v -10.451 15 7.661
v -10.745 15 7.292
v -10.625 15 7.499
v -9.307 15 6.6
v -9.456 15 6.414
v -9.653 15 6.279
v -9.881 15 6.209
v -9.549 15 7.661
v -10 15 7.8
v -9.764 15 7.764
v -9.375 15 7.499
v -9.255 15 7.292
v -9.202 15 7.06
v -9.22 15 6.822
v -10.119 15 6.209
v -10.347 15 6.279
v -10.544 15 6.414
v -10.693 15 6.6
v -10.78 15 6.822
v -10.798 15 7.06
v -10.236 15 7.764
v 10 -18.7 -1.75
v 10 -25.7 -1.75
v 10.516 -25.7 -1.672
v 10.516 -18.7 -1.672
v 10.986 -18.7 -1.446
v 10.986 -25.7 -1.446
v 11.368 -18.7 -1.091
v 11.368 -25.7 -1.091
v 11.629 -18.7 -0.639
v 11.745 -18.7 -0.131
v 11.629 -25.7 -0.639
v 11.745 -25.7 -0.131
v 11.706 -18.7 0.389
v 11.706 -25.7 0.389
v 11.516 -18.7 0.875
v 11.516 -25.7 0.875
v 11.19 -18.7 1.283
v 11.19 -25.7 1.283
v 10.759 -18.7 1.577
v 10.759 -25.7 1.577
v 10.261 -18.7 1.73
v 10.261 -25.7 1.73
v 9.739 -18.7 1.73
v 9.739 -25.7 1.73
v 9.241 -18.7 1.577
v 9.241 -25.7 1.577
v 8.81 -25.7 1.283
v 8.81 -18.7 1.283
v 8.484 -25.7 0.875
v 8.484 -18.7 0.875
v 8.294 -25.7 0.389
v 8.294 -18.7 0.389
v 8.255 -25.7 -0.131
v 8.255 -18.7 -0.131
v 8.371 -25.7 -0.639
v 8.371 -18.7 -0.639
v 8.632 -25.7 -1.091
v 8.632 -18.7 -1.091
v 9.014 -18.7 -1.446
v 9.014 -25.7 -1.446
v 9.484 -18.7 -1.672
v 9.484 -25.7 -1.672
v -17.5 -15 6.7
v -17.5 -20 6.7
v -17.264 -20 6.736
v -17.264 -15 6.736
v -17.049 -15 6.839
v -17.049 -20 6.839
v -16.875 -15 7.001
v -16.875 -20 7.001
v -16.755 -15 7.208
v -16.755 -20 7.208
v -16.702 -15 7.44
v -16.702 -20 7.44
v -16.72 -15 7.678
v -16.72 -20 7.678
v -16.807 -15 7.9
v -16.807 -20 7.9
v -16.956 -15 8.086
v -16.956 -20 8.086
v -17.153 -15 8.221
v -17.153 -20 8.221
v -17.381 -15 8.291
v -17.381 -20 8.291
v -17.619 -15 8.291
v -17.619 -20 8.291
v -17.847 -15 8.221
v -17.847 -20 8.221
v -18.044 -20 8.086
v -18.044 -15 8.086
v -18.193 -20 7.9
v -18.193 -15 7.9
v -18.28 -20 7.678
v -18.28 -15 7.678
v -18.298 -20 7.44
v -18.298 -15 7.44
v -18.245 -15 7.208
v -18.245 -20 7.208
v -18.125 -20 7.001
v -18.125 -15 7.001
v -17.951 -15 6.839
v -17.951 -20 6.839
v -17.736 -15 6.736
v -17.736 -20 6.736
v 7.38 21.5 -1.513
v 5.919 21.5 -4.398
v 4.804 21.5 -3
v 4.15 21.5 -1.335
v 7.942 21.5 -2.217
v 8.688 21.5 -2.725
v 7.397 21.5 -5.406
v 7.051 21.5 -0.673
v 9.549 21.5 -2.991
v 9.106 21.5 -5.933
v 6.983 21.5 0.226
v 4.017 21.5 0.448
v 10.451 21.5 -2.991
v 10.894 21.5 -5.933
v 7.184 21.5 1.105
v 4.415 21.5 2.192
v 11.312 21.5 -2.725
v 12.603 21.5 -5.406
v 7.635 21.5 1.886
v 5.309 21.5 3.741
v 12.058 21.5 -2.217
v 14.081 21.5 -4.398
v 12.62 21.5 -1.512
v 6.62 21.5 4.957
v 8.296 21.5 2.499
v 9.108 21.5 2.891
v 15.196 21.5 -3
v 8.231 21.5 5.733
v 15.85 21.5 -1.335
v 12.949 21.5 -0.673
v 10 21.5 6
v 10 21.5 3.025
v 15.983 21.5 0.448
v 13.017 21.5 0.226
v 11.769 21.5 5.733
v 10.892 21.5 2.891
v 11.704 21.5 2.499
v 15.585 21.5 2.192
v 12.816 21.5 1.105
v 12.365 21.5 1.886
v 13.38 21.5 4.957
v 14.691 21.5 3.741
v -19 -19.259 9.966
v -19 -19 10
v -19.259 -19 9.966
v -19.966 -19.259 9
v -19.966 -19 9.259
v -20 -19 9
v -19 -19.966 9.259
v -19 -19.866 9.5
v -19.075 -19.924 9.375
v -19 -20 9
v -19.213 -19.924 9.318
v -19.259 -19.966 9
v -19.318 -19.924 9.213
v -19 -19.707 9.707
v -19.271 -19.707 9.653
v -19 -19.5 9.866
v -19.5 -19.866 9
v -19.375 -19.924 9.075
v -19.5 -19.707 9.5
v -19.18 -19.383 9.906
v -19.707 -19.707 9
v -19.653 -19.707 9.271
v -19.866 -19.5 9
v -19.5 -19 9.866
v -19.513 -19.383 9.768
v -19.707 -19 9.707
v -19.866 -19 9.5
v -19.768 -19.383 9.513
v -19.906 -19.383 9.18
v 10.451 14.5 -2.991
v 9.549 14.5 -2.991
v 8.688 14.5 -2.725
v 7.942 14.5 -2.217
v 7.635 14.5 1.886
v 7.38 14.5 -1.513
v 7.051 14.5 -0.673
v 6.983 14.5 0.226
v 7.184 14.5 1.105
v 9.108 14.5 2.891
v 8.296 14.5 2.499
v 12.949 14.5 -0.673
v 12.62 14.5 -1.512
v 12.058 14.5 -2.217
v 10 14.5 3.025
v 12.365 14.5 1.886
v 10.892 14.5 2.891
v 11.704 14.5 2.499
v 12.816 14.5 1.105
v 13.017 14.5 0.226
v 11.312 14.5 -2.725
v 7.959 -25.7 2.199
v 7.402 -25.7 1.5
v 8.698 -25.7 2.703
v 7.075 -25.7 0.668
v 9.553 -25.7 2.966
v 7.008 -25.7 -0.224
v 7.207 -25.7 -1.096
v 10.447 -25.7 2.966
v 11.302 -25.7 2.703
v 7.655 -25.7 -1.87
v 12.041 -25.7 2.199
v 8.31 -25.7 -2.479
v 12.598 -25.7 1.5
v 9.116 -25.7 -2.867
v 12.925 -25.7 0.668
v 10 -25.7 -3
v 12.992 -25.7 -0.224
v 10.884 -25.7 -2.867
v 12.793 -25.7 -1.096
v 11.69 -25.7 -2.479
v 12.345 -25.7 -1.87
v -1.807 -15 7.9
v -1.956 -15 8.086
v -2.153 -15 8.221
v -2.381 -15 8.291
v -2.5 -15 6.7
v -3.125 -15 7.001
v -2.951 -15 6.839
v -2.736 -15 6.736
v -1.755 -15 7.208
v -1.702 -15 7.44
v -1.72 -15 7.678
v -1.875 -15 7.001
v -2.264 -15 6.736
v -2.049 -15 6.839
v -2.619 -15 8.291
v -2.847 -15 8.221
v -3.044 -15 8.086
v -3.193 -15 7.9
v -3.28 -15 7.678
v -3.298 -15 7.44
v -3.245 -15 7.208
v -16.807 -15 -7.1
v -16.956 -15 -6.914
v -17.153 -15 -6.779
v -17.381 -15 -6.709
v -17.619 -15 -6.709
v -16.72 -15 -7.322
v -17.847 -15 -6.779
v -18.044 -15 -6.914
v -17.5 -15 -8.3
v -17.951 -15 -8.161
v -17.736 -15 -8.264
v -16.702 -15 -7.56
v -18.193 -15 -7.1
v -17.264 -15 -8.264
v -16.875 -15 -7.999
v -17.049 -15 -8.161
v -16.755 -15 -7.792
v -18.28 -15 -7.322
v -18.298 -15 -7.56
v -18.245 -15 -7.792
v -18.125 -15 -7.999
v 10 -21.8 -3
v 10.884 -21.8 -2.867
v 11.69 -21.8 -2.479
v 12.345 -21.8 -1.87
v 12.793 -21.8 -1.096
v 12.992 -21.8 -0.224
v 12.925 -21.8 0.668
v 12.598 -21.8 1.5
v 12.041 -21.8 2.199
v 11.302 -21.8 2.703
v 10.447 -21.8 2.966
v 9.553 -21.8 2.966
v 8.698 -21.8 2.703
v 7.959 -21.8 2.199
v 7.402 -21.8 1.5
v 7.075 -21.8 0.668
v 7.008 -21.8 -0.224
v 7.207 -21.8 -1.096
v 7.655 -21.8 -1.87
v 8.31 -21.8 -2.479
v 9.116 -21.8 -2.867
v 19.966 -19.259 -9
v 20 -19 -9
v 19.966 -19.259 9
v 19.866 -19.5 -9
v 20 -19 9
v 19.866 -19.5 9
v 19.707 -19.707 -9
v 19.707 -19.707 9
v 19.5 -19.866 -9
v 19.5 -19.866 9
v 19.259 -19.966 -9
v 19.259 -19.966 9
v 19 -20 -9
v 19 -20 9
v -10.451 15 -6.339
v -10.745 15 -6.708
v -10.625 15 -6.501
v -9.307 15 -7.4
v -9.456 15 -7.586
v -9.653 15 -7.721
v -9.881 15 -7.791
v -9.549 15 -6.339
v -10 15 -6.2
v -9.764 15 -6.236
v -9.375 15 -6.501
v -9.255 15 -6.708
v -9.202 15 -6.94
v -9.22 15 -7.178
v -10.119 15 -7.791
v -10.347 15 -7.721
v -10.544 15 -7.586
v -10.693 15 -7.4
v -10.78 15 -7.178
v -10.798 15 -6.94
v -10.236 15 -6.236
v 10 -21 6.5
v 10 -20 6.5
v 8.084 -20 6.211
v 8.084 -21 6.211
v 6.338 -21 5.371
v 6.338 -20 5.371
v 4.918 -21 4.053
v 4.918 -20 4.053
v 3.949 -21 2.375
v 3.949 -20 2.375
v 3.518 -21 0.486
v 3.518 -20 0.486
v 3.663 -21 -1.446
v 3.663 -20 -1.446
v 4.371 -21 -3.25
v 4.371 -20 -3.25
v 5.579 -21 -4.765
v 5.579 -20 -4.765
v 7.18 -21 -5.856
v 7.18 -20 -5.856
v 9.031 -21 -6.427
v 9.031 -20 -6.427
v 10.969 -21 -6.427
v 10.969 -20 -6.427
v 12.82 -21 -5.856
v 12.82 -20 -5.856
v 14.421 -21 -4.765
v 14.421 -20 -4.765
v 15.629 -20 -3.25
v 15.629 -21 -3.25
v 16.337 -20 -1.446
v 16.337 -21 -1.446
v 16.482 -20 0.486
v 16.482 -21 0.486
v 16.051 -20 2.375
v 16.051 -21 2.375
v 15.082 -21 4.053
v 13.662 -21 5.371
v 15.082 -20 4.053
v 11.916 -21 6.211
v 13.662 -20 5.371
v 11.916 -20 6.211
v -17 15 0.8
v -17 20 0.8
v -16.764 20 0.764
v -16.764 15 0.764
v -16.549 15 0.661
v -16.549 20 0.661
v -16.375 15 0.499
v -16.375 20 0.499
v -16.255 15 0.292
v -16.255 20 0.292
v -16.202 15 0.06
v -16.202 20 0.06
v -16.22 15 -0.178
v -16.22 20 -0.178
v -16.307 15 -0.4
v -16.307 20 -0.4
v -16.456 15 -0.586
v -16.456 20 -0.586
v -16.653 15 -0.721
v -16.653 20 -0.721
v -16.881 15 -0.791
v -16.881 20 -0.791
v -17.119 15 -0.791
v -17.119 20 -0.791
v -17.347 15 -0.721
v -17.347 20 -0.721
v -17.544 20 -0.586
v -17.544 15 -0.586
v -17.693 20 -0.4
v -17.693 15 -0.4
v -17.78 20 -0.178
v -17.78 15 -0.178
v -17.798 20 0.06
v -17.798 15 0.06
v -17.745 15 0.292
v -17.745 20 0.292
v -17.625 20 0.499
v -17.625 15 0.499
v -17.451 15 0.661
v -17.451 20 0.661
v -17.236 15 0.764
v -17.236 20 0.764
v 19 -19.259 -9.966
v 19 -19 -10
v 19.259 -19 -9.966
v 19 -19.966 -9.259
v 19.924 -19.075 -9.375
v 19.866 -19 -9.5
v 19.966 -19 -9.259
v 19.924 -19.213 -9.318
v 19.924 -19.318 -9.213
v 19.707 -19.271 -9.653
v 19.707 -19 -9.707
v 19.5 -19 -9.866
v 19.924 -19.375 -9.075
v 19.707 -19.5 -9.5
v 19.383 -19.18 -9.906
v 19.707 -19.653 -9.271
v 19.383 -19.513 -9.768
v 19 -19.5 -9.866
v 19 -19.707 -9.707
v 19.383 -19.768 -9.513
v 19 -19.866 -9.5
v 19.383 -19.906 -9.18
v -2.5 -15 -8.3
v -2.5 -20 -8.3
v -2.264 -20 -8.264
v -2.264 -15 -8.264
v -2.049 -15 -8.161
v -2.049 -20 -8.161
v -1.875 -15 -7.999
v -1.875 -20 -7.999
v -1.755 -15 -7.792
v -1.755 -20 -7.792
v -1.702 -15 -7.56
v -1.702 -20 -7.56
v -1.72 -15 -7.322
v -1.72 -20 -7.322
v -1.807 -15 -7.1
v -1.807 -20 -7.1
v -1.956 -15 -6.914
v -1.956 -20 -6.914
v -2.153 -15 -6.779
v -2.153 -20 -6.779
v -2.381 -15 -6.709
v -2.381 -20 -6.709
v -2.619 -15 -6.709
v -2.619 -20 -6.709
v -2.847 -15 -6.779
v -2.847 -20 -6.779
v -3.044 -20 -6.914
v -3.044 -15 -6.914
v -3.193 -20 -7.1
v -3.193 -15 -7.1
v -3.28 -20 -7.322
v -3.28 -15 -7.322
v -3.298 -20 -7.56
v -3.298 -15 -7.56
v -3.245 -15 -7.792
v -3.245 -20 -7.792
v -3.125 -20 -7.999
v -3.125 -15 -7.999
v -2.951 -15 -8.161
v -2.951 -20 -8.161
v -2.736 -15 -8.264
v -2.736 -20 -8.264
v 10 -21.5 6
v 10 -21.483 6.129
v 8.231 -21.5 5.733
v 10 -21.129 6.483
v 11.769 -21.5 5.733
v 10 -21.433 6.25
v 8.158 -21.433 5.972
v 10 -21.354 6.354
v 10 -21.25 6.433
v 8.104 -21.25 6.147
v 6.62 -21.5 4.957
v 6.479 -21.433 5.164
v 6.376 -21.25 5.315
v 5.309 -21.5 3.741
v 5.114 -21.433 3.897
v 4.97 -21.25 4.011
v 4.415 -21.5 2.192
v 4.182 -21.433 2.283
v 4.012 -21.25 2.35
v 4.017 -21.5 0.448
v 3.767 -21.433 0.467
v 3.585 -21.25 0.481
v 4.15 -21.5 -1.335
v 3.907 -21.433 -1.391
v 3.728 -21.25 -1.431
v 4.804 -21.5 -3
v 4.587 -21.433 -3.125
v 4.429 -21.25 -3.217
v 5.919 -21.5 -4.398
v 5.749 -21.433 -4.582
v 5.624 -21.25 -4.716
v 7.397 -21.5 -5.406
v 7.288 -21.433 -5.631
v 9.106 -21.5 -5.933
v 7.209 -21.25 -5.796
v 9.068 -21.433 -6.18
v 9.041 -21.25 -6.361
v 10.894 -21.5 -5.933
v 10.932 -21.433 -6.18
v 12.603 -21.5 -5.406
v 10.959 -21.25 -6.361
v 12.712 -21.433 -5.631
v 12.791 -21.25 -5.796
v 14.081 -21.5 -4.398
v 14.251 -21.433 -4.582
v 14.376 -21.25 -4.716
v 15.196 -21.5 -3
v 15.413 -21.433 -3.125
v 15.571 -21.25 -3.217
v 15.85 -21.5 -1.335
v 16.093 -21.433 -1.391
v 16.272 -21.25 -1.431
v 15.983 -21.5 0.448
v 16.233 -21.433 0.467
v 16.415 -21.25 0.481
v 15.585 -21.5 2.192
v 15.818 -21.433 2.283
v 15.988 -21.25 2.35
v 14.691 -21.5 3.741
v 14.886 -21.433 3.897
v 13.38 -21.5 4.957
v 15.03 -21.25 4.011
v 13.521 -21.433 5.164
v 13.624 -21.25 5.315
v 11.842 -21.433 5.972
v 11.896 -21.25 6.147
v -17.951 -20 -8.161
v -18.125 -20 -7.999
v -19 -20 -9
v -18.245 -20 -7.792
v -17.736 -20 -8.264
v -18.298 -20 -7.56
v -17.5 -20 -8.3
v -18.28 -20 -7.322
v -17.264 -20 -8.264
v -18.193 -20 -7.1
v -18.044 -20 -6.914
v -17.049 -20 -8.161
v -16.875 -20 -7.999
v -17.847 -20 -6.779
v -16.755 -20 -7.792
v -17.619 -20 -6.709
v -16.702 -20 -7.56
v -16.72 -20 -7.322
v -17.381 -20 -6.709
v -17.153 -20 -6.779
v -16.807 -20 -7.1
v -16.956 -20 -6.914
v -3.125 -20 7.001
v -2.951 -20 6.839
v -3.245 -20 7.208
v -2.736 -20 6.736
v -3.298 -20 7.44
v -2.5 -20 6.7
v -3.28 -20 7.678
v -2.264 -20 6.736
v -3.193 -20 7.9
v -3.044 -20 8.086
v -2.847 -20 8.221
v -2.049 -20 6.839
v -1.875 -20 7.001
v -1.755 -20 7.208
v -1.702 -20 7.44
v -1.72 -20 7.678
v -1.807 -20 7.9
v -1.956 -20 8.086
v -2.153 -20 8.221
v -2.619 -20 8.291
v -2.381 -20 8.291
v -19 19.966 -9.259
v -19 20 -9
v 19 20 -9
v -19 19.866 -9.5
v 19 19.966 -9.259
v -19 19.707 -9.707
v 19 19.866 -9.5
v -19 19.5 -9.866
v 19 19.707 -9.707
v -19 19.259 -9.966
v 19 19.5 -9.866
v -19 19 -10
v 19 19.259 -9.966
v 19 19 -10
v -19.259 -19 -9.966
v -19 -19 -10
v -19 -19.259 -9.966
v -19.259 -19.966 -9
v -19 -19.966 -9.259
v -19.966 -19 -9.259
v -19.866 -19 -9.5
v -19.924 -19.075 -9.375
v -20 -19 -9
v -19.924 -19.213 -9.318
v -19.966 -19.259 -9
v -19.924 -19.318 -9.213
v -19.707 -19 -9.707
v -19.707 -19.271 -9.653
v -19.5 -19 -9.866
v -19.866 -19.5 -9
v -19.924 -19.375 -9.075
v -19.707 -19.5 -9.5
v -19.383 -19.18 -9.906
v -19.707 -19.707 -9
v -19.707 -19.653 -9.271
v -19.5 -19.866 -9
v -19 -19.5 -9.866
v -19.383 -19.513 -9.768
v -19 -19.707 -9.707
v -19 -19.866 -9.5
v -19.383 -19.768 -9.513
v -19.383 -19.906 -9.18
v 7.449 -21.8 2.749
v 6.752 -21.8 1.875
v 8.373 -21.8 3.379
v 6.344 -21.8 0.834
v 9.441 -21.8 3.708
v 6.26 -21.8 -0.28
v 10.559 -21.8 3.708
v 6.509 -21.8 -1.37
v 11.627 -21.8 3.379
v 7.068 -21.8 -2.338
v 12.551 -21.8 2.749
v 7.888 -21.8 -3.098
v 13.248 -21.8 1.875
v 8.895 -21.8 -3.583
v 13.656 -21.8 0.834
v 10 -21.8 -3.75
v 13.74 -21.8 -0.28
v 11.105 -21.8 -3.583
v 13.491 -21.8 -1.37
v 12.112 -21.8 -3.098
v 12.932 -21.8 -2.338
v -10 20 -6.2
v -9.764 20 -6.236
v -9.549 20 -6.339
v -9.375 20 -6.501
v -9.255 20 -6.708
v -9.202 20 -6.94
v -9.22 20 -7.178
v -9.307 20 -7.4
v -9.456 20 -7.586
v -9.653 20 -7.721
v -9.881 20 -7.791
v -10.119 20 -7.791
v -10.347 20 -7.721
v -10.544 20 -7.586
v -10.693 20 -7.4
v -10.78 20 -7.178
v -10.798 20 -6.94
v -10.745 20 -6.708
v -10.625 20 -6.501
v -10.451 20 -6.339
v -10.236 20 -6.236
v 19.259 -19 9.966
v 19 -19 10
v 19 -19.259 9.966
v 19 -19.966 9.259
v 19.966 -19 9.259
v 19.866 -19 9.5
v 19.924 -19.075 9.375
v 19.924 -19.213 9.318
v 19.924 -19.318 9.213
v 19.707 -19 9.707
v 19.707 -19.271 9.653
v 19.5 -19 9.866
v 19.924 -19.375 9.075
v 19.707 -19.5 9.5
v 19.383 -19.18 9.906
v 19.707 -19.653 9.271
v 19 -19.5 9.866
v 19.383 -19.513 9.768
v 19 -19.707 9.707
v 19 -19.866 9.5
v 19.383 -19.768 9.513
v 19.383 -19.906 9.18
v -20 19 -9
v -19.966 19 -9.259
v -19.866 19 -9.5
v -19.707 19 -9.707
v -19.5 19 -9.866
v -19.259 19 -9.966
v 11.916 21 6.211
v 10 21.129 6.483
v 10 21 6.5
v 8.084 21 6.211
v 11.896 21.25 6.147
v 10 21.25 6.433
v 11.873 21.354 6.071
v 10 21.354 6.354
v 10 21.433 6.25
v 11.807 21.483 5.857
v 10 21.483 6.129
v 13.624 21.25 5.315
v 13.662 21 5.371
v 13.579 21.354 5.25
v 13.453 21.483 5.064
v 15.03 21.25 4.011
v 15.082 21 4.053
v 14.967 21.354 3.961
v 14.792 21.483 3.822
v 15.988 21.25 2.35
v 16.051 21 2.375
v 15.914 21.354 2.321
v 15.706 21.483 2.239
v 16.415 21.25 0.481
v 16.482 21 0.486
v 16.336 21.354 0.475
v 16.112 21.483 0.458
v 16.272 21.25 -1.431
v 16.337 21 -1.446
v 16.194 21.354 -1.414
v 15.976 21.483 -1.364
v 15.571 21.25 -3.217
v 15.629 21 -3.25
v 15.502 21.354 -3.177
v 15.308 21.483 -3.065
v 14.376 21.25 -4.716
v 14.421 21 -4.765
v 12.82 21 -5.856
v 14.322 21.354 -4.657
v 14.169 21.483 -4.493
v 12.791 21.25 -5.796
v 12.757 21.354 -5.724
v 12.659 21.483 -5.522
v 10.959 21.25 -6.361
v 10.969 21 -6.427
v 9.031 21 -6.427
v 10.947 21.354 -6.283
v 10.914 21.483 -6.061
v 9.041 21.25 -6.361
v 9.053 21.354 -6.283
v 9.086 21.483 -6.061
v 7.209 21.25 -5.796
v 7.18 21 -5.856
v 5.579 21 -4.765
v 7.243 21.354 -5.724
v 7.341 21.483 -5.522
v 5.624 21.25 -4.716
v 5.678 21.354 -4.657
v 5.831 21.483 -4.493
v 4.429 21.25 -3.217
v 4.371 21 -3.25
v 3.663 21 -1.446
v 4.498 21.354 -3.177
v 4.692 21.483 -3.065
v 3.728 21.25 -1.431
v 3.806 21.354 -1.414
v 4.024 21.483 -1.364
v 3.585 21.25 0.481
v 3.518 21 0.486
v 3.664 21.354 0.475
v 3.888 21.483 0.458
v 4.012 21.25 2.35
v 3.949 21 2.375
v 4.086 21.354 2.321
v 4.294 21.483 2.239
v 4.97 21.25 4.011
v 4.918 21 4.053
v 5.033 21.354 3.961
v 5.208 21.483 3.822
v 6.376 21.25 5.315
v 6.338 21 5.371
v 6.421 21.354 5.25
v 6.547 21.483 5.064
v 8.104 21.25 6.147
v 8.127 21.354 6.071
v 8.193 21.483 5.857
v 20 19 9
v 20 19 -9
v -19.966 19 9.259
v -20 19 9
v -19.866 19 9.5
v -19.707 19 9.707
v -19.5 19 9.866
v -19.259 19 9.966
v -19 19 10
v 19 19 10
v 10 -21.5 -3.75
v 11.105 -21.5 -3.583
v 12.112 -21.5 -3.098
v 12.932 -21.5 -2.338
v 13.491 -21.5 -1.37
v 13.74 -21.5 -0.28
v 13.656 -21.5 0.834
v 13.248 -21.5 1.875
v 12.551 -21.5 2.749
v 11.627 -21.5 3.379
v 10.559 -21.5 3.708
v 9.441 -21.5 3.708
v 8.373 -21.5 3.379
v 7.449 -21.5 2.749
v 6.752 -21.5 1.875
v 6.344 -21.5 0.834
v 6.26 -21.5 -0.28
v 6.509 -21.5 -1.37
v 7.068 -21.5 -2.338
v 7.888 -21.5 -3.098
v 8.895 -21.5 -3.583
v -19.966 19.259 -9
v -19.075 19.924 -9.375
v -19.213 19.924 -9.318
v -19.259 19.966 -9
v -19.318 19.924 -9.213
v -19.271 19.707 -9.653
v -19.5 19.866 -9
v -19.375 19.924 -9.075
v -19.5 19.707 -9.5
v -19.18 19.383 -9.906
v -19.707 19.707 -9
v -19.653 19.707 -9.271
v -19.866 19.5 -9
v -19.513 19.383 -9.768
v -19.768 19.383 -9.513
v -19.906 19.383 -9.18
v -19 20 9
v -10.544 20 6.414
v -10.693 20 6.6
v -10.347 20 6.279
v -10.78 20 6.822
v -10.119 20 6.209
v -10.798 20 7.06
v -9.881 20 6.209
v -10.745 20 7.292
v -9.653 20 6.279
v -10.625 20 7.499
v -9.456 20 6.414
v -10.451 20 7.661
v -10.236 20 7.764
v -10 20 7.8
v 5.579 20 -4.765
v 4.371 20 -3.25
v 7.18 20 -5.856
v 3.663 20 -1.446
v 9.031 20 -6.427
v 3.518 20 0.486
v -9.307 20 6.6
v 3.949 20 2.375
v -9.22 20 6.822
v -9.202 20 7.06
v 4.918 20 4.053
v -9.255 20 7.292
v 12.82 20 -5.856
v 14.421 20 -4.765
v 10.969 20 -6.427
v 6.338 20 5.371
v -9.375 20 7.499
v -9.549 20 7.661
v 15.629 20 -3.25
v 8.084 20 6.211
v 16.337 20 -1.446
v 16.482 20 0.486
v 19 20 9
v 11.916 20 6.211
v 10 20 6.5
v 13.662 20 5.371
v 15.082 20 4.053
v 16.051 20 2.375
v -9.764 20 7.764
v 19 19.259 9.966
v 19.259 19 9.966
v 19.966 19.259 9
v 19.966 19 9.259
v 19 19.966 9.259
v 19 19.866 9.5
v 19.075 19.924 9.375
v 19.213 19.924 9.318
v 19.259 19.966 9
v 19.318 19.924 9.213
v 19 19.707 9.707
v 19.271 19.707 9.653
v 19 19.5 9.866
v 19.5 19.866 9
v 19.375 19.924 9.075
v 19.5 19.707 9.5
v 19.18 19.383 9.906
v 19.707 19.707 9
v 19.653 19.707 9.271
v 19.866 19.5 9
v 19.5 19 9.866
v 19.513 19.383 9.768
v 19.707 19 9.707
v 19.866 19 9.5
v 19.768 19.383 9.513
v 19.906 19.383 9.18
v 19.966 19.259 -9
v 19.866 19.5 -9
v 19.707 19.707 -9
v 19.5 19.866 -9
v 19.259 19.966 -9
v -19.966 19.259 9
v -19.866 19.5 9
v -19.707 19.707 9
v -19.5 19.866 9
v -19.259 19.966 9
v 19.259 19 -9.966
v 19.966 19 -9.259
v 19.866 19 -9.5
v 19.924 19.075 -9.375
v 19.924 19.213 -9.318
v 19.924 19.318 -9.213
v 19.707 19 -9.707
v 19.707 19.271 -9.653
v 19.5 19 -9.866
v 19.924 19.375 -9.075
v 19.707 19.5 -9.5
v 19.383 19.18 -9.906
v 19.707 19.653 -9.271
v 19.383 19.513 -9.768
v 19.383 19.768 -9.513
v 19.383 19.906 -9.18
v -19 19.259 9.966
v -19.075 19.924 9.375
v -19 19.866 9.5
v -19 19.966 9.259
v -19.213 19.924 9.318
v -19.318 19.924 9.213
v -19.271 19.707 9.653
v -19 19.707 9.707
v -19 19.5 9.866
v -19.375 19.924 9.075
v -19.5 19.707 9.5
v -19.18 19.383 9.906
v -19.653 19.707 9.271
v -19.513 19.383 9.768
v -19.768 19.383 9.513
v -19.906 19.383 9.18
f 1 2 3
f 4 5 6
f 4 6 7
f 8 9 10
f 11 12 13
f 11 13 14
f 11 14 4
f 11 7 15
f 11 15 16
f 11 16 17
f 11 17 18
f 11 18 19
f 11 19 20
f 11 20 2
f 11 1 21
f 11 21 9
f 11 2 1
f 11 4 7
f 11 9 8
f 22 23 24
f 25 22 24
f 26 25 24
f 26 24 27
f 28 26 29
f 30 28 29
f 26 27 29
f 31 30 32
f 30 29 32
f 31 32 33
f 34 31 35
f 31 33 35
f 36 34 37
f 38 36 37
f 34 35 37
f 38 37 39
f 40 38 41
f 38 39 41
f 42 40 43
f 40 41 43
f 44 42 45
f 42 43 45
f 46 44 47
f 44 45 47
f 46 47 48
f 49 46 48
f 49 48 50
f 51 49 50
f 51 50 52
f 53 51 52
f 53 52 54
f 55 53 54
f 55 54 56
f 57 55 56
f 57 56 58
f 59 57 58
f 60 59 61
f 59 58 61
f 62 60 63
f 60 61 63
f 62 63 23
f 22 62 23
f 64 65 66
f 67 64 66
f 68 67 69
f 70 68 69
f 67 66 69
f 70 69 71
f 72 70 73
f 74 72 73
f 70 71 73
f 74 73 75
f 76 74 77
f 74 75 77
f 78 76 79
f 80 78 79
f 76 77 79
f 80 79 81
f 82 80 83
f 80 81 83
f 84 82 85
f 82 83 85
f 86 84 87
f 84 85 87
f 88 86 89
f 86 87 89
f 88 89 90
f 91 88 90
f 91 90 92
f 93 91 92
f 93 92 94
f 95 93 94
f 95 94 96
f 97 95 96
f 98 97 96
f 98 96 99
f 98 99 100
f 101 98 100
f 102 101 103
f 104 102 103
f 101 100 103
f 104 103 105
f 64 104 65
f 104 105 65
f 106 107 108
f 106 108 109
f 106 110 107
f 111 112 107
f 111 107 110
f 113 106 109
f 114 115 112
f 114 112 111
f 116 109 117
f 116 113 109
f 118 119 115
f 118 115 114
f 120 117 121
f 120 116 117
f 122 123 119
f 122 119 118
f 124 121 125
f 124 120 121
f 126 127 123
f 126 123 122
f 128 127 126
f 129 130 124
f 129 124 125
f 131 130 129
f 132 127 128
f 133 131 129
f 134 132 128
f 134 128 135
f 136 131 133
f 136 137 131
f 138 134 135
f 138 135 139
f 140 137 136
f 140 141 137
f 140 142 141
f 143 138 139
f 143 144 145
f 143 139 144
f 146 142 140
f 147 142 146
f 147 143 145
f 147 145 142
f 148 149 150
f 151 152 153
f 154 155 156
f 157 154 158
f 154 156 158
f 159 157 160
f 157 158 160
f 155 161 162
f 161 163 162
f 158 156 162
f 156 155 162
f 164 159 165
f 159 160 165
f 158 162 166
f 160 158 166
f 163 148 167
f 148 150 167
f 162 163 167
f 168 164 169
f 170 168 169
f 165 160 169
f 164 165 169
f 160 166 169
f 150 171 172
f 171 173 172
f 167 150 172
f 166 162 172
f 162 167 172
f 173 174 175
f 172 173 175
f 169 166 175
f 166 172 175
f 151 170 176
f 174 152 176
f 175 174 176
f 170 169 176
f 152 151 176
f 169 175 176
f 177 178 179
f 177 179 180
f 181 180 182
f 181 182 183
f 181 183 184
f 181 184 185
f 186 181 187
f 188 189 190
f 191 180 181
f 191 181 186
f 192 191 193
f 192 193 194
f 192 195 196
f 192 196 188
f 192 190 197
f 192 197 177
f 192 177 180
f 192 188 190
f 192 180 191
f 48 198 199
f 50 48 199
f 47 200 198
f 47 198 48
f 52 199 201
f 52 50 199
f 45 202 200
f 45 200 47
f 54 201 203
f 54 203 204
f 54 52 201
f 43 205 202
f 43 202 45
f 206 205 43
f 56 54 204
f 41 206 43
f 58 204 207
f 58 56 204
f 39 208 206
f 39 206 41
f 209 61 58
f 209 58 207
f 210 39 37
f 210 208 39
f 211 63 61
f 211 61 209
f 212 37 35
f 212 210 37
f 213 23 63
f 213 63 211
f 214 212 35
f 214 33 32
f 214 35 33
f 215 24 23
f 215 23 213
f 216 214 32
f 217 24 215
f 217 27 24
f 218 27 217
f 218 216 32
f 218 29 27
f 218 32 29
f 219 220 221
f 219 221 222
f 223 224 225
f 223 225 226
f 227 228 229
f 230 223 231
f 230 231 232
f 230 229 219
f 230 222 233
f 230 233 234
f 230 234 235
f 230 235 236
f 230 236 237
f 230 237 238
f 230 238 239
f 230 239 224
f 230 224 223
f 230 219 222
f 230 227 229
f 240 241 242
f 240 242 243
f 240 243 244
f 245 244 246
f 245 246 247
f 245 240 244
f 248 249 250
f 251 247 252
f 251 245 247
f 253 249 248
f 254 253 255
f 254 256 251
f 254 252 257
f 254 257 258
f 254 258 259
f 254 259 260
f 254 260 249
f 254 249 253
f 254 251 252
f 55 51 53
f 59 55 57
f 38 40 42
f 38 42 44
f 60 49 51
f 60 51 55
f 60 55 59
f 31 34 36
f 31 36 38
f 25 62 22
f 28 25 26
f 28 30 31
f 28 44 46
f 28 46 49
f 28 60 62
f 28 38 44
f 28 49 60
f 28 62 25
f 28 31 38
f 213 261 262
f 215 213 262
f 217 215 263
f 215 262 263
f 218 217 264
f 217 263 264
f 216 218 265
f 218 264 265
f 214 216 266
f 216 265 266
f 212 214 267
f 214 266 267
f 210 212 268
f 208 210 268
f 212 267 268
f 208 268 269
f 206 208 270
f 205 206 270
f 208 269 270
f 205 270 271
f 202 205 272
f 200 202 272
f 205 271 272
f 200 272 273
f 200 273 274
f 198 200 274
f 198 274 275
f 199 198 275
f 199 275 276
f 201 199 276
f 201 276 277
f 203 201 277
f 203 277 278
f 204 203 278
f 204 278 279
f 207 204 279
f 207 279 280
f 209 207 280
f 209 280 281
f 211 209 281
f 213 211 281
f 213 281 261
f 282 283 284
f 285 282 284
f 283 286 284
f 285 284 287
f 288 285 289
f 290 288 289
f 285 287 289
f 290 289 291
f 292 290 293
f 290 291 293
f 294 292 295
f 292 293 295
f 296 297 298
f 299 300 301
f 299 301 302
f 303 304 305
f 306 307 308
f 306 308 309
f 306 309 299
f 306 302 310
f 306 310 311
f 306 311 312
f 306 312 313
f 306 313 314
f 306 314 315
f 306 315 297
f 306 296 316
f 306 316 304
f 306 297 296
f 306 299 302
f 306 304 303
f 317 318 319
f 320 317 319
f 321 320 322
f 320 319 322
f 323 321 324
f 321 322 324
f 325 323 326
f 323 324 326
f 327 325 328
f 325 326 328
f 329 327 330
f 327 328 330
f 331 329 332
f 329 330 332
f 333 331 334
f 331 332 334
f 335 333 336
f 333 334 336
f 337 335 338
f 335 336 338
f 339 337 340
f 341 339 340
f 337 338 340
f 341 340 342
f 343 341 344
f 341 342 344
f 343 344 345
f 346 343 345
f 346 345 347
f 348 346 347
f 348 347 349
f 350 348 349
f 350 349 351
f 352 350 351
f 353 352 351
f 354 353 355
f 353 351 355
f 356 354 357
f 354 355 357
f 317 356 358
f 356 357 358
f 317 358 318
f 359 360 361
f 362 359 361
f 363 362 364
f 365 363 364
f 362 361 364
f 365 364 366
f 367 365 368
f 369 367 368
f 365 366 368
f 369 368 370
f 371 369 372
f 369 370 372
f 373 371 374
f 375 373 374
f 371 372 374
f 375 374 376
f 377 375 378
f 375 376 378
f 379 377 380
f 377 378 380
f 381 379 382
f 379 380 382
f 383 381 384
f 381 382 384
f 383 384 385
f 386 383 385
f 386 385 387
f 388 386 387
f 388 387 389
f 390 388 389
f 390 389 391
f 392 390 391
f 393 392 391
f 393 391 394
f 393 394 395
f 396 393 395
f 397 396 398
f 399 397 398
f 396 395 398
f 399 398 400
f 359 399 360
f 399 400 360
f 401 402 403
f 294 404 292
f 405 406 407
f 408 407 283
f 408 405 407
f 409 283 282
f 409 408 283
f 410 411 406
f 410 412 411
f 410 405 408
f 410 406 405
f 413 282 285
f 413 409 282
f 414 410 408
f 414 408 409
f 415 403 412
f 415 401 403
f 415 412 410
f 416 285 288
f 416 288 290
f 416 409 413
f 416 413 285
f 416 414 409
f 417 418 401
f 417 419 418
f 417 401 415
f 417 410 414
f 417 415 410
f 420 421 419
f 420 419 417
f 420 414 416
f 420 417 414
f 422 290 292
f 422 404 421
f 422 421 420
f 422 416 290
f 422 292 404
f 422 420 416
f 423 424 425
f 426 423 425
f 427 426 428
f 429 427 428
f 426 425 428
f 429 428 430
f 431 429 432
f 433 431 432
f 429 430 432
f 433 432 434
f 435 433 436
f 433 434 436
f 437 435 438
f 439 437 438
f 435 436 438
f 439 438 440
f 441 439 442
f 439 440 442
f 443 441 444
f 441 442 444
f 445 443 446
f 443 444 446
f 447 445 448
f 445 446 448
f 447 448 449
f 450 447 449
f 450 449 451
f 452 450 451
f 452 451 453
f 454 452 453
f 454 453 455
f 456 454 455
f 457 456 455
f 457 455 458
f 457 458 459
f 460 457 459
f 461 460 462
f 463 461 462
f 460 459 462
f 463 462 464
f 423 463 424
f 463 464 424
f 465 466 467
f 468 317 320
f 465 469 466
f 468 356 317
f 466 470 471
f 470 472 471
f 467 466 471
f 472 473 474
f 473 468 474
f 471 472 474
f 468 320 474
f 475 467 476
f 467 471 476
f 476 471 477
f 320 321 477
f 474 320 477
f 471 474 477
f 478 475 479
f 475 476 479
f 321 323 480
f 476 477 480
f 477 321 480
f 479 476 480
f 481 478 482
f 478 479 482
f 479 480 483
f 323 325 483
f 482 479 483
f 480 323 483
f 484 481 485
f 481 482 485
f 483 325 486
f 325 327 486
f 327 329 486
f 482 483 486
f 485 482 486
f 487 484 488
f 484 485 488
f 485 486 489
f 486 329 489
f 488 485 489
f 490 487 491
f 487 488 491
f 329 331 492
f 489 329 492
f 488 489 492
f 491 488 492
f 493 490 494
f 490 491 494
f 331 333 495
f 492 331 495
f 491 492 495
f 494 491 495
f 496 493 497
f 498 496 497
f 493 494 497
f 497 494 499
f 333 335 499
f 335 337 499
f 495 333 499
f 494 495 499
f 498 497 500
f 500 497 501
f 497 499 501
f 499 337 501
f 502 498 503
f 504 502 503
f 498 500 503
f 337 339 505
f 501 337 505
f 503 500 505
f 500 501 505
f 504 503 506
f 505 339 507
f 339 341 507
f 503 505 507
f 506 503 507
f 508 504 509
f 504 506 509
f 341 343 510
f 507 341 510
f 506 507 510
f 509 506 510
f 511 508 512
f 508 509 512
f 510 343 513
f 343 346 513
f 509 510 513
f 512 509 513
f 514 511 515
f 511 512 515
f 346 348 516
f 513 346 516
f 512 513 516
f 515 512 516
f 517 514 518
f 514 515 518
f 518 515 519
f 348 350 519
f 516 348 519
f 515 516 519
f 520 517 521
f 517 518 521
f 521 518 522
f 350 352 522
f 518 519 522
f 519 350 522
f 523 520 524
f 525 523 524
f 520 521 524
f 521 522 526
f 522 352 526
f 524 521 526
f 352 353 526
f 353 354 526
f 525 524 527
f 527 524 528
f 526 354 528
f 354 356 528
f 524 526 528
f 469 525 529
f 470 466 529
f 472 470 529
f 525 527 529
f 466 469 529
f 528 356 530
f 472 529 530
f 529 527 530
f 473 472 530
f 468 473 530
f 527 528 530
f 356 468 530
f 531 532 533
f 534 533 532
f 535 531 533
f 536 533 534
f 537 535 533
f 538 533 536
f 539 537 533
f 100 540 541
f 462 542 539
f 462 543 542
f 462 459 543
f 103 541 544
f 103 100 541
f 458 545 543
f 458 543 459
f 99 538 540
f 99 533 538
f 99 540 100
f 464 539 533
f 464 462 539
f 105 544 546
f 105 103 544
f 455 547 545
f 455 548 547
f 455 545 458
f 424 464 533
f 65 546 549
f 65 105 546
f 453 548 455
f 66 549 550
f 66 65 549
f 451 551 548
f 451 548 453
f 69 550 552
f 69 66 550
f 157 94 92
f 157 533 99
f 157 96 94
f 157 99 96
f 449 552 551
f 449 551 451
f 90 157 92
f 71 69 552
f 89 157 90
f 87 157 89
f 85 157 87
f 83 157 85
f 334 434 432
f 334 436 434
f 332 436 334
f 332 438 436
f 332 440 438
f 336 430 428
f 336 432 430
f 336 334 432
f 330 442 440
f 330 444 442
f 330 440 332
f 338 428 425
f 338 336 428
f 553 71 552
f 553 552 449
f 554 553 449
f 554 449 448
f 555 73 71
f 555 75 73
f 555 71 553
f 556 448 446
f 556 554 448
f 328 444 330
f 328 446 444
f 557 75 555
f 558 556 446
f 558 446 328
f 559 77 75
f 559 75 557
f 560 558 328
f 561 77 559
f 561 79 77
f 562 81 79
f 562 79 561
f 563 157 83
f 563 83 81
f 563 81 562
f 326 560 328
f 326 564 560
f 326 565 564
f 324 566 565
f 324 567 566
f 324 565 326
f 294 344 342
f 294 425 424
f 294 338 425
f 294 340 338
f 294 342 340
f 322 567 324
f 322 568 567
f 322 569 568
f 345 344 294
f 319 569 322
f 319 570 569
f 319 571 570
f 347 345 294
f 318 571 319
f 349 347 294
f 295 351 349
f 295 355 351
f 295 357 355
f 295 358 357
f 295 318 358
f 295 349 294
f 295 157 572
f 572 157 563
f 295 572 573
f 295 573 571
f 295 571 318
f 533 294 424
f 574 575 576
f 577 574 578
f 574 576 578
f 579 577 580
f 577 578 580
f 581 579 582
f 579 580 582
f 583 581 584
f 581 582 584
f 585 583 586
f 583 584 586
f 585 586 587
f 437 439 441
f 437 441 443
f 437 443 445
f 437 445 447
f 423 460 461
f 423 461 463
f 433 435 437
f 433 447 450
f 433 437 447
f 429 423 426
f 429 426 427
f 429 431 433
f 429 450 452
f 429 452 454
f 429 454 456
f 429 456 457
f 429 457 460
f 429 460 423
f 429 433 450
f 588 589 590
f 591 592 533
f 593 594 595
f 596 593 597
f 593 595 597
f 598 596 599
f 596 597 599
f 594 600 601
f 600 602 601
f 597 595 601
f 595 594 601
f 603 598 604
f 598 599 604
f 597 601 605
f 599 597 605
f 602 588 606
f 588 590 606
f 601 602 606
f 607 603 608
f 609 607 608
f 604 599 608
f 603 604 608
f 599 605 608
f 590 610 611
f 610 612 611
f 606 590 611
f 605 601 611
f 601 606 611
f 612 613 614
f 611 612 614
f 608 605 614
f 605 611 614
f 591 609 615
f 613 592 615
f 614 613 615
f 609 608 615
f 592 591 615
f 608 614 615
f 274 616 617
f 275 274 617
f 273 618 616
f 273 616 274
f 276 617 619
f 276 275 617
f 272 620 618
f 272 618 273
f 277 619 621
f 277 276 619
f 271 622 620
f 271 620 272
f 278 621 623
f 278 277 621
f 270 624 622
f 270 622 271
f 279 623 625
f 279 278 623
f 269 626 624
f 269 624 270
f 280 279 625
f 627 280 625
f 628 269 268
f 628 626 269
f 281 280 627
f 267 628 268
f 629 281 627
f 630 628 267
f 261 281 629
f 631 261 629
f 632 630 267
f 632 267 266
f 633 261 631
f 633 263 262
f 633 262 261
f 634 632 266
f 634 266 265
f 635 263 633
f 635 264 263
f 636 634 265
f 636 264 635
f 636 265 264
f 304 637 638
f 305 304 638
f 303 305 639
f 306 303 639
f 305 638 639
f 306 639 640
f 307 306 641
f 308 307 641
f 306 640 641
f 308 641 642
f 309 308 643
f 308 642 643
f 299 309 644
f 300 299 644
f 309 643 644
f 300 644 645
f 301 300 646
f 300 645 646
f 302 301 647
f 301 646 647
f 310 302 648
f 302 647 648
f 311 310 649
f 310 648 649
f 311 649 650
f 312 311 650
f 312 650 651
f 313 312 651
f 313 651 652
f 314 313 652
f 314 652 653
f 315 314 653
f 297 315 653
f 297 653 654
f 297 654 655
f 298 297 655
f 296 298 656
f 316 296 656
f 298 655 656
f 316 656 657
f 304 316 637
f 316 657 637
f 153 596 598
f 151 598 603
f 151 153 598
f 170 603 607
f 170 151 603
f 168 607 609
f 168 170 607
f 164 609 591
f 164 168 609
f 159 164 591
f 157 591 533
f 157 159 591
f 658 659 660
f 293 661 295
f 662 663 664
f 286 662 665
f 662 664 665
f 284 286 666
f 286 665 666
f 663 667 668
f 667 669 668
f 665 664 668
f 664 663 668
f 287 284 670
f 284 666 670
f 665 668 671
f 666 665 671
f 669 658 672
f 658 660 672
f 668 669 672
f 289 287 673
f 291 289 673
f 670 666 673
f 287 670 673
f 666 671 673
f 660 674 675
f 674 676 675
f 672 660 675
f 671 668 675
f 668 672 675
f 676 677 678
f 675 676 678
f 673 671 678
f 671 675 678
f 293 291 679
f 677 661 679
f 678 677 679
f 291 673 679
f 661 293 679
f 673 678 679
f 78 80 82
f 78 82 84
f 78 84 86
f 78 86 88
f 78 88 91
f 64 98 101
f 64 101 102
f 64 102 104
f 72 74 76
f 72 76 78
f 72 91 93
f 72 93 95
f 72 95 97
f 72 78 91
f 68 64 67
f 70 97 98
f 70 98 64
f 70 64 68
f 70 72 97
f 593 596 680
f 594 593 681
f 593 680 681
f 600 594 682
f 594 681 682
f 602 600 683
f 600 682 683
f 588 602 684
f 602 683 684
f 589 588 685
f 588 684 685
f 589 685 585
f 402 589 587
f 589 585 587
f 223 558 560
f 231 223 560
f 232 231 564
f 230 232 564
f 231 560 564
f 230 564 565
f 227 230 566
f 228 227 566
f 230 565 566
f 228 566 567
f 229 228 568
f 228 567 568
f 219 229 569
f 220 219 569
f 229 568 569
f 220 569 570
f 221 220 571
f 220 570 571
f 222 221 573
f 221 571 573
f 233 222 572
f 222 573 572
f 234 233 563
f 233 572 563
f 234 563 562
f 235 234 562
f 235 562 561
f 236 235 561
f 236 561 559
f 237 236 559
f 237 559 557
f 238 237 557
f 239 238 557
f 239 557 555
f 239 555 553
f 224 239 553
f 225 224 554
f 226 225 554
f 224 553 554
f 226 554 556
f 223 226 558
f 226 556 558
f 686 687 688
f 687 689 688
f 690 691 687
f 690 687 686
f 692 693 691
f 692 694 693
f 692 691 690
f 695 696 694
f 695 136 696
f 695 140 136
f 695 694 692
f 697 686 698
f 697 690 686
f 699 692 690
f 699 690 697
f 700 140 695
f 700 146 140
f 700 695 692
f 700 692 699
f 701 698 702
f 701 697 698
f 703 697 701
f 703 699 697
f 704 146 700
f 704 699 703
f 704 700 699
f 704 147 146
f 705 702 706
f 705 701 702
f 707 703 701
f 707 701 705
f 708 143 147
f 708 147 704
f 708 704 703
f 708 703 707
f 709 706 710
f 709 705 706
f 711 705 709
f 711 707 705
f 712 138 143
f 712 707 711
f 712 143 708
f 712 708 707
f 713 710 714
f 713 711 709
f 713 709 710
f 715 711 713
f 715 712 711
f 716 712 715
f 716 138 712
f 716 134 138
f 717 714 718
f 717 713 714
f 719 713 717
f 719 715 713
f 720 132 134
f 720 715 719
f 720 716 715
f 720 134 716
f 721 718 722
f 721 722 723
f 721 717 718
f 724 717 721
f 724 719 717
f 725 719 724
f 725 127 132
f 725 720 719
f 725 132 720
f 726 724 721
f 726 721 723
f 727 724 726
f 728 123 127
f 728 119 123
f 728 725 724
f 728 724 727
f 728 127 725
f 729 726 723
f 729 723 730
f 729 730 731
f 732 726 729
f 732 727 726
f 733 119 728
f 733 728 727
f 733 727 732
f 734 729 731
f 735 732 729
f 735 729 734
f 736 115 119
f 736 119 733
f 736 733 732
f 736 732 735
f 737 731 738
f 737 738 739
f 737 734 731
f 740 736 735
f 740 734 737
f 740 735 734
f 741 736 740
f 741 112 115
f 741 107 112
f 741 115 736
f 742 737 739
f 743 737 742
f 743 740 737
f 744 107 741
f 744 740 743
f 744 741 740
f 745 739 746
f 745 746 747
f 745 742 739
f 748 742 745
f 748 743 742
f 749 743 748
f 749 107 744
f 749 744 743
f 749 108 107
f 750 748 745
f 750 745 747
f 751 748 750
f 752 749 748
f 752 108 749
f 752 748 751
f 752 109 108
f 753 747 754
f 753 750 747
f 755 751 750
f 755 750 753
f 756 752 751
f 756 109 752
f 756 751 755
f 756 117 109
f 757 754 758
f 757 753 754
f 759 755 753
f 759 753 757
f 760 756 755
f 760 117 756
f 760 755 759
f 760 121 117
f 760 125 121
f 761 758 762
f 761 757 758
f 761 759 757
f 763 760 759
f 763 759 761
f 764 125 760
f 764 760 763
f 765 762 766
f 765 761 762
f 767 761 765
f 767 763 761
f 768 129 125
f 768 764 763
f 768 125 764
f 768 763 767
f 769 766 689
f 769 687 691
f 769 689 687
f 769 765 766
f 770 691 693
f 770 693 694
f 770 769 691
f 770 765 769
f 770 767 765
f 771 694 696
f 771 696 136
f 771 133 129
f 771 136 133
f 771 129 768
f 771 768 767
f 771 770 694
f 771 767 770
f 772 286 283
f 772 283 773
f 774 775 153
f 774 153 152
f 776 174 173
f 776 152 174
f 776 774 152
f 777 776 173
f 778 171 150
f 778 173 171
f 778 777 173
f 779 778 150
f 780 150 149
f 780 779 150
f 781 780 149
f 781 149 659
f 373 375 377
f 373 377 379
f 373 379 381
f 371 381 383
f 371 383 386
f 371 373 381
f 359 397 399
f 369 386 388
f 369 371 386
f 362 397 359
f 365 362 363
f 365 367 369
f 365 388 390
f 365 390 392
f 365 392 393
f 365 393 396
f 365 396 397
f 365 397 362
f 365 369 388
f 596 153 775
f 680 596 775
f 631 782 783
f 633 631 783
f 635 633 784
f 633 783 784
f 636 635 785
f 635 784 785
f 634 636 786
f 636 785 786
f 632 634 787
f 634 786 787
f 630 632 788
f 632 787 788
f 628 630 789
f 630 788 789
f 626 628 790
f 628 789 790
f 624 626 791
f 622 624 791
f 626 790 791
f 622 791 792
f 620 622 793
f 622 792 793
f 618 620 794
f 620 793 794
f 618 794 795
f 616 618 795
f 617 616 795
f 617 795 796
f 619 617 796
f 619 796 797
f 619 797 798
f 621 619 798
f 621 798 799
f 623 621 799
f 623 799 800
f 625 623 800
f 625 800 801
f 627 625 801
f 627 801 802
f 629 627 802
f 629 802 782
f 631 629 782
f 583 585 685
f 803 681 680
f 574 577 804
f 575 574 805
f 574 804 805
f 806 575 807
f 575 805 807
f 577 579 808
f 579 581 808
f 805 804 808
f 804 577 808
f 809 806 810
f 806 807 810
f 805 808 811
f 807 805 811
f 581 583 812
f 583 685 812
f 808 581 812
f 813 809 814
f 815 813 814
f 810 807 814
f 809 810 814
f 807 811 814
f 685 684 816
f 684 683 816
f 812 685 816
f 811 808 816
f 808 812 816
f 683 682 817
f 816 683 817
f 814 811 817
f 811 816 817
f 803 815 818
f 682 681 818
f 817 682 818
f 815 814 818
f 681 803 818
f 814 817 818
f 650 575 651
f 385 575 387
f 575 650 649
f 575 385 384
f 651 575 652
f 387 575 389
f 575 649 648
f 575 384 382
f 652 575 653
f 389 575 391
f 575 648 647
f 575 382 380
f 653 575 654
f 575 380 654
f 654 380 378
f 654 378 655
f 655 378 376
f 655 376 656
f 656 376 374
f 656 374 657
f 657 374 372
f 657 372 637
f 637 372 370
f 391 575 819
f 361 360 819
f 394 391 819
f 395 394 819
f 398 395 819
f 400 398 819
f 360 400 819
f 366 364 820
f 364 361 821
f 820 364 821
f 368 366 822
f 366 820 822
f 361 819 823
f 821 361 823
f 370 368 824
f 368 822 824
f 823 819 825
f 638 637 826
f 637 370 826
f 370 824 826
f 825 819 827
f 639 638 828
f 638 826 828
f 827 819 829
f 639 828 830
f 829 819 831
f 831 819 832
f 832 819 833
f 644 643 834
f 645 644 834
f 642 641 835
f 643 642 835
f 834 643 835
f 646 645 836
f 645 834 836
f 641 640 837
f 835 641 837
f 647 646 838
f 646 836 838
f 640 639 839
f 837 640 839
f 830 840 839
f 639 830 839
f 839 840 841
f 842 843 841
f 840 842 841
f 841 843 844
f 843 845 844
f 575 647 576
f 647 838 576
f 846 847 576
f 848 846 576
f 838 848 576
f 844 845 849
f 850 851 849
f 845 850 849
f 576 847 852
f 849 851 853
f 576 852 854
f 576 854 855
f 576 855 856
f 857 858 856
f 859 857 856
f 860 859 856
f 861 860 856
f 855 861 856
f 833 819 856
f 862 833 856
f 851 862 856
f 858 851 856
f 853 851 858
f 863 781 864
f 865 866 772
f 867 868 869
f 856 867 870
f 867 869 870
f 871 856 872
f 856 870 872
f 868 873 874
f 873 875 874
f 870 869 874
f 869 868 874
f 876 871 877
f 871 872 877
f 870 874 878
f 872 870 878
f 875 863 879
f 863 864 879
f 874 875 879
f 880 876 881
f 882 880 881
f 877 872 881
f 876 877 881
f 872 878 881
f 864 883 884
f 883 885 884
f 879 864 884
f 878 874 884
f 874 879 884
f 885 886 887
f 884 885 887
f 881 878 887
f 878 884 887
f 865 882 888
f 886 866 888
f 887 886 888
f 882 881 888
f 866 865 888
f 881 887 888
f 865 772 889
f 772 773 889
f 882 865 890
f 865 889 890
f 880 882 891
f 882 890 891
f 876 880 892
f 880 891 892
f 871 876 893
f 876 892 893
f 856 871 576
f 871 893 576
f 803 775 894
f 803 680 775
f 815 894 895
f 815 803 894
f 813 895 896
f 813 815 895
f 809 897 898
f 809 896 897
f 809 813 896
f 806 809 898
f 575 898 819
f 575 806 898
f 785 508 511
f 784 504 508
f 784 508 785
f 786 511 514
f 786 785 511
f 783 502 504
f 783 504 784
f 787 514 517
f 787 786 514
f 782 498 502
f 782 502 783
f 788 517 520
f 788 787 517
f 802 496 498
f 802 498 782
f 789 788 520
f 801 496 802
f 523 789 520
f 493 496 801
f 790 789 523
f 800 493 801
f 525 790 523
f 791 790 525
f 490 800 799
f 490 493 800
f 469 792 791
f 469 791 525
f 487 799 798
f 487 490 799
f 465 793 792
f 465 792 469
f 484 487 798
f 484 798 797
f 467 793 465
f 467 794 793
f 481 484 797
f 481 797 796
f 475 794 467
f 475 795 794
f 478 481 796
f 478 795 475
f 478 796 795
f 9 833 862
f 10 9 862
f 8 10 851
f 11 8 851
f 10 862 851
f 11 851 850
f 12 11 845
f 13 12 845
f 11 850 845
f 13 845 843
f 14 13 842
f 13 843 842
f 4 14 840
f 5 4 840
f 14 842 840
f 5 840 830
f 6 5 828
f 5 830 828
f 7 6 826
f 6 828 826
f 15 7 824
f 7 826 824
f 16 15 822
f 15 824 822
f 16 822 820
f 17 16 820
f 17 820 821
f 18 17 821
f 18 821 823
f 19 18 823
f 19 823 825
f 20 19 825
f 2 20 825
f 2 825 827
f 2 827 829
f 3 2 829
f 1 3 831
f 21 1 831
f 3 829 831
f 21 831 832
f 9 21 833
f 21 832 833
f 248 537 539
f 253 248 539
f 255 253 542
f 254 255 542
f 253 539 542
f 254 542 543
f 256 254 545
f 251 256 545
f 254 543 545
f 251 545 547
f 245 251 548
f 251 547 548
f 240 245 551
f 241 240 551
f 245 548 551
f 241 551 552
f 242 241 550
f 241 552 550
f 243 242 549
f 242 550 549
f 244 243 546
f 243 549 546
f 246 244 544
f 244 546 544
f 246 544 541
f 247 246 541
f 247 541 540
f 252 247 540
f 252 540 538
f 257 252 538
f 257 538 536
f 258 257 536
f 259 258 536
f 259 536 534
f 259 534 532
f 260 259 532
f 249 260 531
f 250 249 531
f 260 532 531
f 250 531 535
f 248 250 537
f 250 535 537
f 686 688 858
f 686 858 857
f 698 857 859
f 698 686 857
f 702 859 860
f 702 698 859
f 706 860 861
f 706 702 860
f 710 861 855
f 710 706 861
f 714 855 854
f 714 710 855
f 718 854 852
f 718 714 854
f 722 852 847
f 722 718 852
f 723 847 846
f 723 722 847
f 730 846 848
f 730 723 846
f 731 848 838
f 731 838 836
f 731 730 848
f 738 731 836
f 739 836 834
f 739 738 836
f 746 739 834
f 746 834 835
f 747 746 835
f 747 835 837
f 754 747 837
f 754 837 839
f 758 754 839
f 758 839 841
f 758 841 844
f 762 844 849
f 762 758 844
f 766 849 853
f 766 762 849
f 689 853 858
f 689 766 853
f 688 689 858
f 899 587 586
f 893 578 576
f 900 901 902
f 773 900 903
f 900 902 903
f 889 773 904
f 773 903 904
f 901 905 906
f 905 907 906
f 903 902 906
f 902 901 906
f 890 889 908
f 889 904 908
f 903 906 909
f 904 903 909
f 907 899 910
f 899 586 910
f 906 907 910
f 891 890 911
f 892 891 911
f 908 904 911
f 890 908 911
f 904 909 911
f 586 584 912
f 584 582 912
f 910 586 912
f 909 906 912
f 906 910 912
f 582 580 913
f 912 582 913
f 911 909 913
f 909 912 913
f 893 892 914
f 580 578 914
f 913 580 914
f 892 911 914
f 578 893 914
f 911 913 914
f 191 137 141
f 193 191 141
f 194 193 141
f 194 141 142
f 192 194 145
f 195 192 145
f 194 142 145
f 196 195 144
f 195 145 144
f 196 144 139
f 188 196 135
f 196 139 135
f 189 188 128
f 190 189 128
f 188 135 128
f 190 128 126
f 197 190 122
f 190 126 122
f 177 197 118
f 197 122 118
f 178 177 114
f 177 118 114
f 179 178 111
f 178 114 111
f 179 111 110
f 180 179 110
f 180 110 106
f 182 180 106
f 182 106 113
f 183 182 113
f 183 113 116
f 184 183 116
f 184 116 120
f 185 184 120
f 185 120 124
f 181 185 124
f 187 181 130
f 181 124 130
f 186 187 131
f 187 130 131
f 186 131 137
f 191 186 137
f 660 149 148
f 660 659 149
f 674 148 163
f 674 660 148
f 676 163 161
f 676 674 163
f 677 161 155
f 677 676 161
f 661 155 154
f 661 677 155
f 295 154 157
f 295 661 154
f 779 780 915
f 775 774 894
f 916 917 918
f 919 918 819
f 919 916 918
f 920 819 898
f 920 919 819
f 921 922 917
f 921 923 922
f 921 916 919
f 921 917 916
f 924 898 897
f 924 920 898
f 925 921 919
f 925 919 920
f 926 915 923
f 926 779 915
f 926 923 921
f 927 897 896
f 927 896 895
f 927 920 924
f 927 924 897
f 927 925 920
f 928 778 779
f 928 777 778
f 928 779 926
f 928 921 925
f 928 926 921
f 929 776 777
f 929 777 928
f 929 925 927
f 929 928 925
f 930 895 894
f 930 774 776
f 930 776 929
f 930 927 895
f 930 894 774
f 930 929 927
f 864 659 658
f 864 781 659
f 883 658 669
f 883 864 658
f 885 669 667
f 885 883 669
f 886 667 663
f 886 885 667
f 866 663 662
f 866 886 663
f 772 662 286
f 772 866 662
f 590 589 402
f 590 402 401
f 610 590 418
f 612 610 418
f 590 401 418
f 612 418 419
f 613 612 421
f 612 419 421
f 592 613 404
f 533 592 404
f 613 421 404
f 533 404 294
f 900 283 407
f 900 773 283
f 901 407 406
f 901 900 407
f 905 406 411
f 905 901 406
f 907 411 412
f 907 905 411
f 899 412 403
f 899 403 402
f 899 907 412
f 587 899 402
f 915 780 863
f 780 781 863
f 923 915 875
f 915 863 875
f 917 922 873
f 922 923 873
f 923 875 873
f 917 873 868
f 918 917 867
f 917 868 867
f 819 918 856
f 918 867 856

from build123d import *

# Parameters (mm, degrees)
SKETCH_1_W          = 40
SKETCH_1_H          = 40
EXTRUDE_1_DEPTH     = 10
FILLET_1_R          = 1
SKETCH_5_R          = 0.8
CUT_EXTRUDE_2_DEPTH = 5
SKETCH_6_R          = 0.8
CUT_EXTRUDE_3_DEPTH = 5
SKETCH_2_R          = 6.5
EXTRUDE_2_DEPTH     = 1.5
SKETCH_2_3_R        = 3.75
EXTRUDE_3_DEPTH     = 1.8
SKETCH_2_4_R        = 3
EXTRUDE_4_DEPTH     = 5.7
CUT_EXTRUDE_START   = 5.7
SKETCH_2_5_R        = 1.75
CUT_EXTRUDE_4_DEPTH = 7
FILLET_2_R          = 0.5
EXTRUDE_START       = 1.5
SKETCH_4_R          = 6.5
EXTRUDE_5_DEPTH     = 1.5
CUT_EXTRUDE_START_2 = 1.5
SKETCH_4_4_R        = 3.025
CUT_EXTRUDE_5_DEPTH = 7
FILLET_3_R          = 0.5


with BuildPart() as part:
    # 草图1 → 凸台-拉伸1 (new, symmetric)
    with BuildSketch(Plane.XY):
        Rectangle(SKETCH_1_W, SKETCH_1_H)
    extrude(amount=EXTRUDE_1_DEPTH, both=True)

    # 圆角1
    fillet_1_edges = [part.edges().sort_by_distance(p)[0] for p in [
        (-20, 0, 10),
        (0, -20, 10),
        (20, 0, 10),
        (0, -20, -10),
        (-20, 0, -10),
        (0, 20, -10),
        (20, 0, -10),
        (0, 20, 10),
        (20, -20, 0),
        (-20, -20, 0),
        (-20, 20, 0),
        (20, 20, 0),
    ]]
    fillet(fillet_1_edges, radius=FILLET_1_R)

    # 草图5 → 切除-拉伸2 (cut)
    with BuildSketch(Plane(origin=(0, -20, 0), x_dir=(-1, 0, 0), z_dir=(0, -1, 0))):
        with Locations(Location((17.5, -7.5, 0), (0, 0, 90))):
            Circle(SKETCH_5_R)
        with Locations(Location((2.5, -7.5, 0), (0, 0, 90))):
            Circle(SKETCH_5_R)
        with Locations(Location((2.5, 7.5, 0), (0, 0, 90))):
            Circle(SKETCH_5_R)
        with Locations(Location((17.5, 7.5, 0), (0, 0, 90))):
            Circle(SKETCH_5_R)
    extrude(amount=-CUT_EXTRUDE_2_DEPTH, mode=Mode.SUBTRACT)

    # 草图6 → 切除-拉伸3 (cut)
    with BuildSketch(Plane(origin=(0, 20, 0), x_dir=(1, 0, 0), z_dir=(0, 1, 0))):
        with Locations(Location((-10, 7, 0), (0, 0, 270))):
            Circle(SKETCH_6_R)
        with Locations(Location((-17, 0, 0), (0, 0, 270))):
            Circle(SKETCH_6_R)
        with Locations(Location((-10, -7, 0), (0, 0, 270))):
            Circle(SKETCH_6_R)
    extrude(amount=-CUT_EXTRUDE_3_DEPTH, mode=Mode.SUBTRACT)

    # 草图2 → 凸台-拉伸2 (add)
    with BuildSketch(Plane.XZ.offset(20)):
        with Locations(Location((10, 0, 0), (0, 0, 90))):
            Circle(SKETCH_2_R)
    extrude(amount=EXTRUDE_2_DEPTH)

    # 草图2<3> → 凸台-拉伸3 (add)
    with BuildSketch(Plane.XZ.offset(20)):
        with Locations(Location((10, 0, 0), (0, 0, 270))):
            Circle(SKETCH_2_3_R)
    extrude(amount=EXTRUDE_3_DEPTH)

    # 草图2<4> → 凸台-拉伸4 (add)
    with BuildSketch(Plane.XZ.offset(20)):
        with Locations(Location((10, 0, 0), (0, 0, 270))):
            Circle(SKETCH_2_4_R)
    extrude(amount=EXTRUDE_4_DEPTH)

    # 草图2<5> → 切除-拉伸4 (cut)
    with BuildSketch(Plane.XZ.offset(20).offset(CUT_EXTRUDE_START)):
        with Locations(Location((10, 0, 0), (0, 0, 270))):
            Circle(SKETCH_2_5_R)
    extrude(amount=-CUT_EXTRUDE_4_DEPTH, mode=Mode.SUBTRACT)

    # 圆角2
    fillet_2_edges = [part.edges().sort_by_distance(p)[0] for p in [
        (10, -21.5, -6.5),
    ]]
    fillet(fillet_2_edges, radius=FILLET_2_R)

    # 草图4 → 凸台-拉伸5 (add)
    with BuildSketch(Plane(origin=(0, 20, 0), x_dir=(1, 0, 0), z_dir=(0, 1, 0)).offset(EXTRUDE_START)):
        with Locations(Location((10, 0, 0), (0, 0, 270))):
            Circle(SKETCH_4_R)
    extrude(amount=-EXTRUDE_5_DEPTH)

    # 草图4<4> → 切除-拉伸5 (cut)
    with BuildSketch(Plane(origin=(0, 20, 0), x_dir=(1, 0, 0), z_dir=(0, 1, 0)).offset(CUT_EXTRUDE_START_2)):
        with Locations(Location((10, 0, 0), (0, 0, 270))):
            Circle(SKETCH_4_4_R)
    extrude(amount=-CUT_EXTRUDE_5_DEPTH, mode=Mode.SUBTRACT)

    # 圆角3
    fillet_3_edges = [part.edges().sort_by_distance(p)[0] for p in [
        (10, 21.5, -6.5),
    ]]
    fillet(fillet_3_edges, radius=FILLET_3_R)


solid = part.part
